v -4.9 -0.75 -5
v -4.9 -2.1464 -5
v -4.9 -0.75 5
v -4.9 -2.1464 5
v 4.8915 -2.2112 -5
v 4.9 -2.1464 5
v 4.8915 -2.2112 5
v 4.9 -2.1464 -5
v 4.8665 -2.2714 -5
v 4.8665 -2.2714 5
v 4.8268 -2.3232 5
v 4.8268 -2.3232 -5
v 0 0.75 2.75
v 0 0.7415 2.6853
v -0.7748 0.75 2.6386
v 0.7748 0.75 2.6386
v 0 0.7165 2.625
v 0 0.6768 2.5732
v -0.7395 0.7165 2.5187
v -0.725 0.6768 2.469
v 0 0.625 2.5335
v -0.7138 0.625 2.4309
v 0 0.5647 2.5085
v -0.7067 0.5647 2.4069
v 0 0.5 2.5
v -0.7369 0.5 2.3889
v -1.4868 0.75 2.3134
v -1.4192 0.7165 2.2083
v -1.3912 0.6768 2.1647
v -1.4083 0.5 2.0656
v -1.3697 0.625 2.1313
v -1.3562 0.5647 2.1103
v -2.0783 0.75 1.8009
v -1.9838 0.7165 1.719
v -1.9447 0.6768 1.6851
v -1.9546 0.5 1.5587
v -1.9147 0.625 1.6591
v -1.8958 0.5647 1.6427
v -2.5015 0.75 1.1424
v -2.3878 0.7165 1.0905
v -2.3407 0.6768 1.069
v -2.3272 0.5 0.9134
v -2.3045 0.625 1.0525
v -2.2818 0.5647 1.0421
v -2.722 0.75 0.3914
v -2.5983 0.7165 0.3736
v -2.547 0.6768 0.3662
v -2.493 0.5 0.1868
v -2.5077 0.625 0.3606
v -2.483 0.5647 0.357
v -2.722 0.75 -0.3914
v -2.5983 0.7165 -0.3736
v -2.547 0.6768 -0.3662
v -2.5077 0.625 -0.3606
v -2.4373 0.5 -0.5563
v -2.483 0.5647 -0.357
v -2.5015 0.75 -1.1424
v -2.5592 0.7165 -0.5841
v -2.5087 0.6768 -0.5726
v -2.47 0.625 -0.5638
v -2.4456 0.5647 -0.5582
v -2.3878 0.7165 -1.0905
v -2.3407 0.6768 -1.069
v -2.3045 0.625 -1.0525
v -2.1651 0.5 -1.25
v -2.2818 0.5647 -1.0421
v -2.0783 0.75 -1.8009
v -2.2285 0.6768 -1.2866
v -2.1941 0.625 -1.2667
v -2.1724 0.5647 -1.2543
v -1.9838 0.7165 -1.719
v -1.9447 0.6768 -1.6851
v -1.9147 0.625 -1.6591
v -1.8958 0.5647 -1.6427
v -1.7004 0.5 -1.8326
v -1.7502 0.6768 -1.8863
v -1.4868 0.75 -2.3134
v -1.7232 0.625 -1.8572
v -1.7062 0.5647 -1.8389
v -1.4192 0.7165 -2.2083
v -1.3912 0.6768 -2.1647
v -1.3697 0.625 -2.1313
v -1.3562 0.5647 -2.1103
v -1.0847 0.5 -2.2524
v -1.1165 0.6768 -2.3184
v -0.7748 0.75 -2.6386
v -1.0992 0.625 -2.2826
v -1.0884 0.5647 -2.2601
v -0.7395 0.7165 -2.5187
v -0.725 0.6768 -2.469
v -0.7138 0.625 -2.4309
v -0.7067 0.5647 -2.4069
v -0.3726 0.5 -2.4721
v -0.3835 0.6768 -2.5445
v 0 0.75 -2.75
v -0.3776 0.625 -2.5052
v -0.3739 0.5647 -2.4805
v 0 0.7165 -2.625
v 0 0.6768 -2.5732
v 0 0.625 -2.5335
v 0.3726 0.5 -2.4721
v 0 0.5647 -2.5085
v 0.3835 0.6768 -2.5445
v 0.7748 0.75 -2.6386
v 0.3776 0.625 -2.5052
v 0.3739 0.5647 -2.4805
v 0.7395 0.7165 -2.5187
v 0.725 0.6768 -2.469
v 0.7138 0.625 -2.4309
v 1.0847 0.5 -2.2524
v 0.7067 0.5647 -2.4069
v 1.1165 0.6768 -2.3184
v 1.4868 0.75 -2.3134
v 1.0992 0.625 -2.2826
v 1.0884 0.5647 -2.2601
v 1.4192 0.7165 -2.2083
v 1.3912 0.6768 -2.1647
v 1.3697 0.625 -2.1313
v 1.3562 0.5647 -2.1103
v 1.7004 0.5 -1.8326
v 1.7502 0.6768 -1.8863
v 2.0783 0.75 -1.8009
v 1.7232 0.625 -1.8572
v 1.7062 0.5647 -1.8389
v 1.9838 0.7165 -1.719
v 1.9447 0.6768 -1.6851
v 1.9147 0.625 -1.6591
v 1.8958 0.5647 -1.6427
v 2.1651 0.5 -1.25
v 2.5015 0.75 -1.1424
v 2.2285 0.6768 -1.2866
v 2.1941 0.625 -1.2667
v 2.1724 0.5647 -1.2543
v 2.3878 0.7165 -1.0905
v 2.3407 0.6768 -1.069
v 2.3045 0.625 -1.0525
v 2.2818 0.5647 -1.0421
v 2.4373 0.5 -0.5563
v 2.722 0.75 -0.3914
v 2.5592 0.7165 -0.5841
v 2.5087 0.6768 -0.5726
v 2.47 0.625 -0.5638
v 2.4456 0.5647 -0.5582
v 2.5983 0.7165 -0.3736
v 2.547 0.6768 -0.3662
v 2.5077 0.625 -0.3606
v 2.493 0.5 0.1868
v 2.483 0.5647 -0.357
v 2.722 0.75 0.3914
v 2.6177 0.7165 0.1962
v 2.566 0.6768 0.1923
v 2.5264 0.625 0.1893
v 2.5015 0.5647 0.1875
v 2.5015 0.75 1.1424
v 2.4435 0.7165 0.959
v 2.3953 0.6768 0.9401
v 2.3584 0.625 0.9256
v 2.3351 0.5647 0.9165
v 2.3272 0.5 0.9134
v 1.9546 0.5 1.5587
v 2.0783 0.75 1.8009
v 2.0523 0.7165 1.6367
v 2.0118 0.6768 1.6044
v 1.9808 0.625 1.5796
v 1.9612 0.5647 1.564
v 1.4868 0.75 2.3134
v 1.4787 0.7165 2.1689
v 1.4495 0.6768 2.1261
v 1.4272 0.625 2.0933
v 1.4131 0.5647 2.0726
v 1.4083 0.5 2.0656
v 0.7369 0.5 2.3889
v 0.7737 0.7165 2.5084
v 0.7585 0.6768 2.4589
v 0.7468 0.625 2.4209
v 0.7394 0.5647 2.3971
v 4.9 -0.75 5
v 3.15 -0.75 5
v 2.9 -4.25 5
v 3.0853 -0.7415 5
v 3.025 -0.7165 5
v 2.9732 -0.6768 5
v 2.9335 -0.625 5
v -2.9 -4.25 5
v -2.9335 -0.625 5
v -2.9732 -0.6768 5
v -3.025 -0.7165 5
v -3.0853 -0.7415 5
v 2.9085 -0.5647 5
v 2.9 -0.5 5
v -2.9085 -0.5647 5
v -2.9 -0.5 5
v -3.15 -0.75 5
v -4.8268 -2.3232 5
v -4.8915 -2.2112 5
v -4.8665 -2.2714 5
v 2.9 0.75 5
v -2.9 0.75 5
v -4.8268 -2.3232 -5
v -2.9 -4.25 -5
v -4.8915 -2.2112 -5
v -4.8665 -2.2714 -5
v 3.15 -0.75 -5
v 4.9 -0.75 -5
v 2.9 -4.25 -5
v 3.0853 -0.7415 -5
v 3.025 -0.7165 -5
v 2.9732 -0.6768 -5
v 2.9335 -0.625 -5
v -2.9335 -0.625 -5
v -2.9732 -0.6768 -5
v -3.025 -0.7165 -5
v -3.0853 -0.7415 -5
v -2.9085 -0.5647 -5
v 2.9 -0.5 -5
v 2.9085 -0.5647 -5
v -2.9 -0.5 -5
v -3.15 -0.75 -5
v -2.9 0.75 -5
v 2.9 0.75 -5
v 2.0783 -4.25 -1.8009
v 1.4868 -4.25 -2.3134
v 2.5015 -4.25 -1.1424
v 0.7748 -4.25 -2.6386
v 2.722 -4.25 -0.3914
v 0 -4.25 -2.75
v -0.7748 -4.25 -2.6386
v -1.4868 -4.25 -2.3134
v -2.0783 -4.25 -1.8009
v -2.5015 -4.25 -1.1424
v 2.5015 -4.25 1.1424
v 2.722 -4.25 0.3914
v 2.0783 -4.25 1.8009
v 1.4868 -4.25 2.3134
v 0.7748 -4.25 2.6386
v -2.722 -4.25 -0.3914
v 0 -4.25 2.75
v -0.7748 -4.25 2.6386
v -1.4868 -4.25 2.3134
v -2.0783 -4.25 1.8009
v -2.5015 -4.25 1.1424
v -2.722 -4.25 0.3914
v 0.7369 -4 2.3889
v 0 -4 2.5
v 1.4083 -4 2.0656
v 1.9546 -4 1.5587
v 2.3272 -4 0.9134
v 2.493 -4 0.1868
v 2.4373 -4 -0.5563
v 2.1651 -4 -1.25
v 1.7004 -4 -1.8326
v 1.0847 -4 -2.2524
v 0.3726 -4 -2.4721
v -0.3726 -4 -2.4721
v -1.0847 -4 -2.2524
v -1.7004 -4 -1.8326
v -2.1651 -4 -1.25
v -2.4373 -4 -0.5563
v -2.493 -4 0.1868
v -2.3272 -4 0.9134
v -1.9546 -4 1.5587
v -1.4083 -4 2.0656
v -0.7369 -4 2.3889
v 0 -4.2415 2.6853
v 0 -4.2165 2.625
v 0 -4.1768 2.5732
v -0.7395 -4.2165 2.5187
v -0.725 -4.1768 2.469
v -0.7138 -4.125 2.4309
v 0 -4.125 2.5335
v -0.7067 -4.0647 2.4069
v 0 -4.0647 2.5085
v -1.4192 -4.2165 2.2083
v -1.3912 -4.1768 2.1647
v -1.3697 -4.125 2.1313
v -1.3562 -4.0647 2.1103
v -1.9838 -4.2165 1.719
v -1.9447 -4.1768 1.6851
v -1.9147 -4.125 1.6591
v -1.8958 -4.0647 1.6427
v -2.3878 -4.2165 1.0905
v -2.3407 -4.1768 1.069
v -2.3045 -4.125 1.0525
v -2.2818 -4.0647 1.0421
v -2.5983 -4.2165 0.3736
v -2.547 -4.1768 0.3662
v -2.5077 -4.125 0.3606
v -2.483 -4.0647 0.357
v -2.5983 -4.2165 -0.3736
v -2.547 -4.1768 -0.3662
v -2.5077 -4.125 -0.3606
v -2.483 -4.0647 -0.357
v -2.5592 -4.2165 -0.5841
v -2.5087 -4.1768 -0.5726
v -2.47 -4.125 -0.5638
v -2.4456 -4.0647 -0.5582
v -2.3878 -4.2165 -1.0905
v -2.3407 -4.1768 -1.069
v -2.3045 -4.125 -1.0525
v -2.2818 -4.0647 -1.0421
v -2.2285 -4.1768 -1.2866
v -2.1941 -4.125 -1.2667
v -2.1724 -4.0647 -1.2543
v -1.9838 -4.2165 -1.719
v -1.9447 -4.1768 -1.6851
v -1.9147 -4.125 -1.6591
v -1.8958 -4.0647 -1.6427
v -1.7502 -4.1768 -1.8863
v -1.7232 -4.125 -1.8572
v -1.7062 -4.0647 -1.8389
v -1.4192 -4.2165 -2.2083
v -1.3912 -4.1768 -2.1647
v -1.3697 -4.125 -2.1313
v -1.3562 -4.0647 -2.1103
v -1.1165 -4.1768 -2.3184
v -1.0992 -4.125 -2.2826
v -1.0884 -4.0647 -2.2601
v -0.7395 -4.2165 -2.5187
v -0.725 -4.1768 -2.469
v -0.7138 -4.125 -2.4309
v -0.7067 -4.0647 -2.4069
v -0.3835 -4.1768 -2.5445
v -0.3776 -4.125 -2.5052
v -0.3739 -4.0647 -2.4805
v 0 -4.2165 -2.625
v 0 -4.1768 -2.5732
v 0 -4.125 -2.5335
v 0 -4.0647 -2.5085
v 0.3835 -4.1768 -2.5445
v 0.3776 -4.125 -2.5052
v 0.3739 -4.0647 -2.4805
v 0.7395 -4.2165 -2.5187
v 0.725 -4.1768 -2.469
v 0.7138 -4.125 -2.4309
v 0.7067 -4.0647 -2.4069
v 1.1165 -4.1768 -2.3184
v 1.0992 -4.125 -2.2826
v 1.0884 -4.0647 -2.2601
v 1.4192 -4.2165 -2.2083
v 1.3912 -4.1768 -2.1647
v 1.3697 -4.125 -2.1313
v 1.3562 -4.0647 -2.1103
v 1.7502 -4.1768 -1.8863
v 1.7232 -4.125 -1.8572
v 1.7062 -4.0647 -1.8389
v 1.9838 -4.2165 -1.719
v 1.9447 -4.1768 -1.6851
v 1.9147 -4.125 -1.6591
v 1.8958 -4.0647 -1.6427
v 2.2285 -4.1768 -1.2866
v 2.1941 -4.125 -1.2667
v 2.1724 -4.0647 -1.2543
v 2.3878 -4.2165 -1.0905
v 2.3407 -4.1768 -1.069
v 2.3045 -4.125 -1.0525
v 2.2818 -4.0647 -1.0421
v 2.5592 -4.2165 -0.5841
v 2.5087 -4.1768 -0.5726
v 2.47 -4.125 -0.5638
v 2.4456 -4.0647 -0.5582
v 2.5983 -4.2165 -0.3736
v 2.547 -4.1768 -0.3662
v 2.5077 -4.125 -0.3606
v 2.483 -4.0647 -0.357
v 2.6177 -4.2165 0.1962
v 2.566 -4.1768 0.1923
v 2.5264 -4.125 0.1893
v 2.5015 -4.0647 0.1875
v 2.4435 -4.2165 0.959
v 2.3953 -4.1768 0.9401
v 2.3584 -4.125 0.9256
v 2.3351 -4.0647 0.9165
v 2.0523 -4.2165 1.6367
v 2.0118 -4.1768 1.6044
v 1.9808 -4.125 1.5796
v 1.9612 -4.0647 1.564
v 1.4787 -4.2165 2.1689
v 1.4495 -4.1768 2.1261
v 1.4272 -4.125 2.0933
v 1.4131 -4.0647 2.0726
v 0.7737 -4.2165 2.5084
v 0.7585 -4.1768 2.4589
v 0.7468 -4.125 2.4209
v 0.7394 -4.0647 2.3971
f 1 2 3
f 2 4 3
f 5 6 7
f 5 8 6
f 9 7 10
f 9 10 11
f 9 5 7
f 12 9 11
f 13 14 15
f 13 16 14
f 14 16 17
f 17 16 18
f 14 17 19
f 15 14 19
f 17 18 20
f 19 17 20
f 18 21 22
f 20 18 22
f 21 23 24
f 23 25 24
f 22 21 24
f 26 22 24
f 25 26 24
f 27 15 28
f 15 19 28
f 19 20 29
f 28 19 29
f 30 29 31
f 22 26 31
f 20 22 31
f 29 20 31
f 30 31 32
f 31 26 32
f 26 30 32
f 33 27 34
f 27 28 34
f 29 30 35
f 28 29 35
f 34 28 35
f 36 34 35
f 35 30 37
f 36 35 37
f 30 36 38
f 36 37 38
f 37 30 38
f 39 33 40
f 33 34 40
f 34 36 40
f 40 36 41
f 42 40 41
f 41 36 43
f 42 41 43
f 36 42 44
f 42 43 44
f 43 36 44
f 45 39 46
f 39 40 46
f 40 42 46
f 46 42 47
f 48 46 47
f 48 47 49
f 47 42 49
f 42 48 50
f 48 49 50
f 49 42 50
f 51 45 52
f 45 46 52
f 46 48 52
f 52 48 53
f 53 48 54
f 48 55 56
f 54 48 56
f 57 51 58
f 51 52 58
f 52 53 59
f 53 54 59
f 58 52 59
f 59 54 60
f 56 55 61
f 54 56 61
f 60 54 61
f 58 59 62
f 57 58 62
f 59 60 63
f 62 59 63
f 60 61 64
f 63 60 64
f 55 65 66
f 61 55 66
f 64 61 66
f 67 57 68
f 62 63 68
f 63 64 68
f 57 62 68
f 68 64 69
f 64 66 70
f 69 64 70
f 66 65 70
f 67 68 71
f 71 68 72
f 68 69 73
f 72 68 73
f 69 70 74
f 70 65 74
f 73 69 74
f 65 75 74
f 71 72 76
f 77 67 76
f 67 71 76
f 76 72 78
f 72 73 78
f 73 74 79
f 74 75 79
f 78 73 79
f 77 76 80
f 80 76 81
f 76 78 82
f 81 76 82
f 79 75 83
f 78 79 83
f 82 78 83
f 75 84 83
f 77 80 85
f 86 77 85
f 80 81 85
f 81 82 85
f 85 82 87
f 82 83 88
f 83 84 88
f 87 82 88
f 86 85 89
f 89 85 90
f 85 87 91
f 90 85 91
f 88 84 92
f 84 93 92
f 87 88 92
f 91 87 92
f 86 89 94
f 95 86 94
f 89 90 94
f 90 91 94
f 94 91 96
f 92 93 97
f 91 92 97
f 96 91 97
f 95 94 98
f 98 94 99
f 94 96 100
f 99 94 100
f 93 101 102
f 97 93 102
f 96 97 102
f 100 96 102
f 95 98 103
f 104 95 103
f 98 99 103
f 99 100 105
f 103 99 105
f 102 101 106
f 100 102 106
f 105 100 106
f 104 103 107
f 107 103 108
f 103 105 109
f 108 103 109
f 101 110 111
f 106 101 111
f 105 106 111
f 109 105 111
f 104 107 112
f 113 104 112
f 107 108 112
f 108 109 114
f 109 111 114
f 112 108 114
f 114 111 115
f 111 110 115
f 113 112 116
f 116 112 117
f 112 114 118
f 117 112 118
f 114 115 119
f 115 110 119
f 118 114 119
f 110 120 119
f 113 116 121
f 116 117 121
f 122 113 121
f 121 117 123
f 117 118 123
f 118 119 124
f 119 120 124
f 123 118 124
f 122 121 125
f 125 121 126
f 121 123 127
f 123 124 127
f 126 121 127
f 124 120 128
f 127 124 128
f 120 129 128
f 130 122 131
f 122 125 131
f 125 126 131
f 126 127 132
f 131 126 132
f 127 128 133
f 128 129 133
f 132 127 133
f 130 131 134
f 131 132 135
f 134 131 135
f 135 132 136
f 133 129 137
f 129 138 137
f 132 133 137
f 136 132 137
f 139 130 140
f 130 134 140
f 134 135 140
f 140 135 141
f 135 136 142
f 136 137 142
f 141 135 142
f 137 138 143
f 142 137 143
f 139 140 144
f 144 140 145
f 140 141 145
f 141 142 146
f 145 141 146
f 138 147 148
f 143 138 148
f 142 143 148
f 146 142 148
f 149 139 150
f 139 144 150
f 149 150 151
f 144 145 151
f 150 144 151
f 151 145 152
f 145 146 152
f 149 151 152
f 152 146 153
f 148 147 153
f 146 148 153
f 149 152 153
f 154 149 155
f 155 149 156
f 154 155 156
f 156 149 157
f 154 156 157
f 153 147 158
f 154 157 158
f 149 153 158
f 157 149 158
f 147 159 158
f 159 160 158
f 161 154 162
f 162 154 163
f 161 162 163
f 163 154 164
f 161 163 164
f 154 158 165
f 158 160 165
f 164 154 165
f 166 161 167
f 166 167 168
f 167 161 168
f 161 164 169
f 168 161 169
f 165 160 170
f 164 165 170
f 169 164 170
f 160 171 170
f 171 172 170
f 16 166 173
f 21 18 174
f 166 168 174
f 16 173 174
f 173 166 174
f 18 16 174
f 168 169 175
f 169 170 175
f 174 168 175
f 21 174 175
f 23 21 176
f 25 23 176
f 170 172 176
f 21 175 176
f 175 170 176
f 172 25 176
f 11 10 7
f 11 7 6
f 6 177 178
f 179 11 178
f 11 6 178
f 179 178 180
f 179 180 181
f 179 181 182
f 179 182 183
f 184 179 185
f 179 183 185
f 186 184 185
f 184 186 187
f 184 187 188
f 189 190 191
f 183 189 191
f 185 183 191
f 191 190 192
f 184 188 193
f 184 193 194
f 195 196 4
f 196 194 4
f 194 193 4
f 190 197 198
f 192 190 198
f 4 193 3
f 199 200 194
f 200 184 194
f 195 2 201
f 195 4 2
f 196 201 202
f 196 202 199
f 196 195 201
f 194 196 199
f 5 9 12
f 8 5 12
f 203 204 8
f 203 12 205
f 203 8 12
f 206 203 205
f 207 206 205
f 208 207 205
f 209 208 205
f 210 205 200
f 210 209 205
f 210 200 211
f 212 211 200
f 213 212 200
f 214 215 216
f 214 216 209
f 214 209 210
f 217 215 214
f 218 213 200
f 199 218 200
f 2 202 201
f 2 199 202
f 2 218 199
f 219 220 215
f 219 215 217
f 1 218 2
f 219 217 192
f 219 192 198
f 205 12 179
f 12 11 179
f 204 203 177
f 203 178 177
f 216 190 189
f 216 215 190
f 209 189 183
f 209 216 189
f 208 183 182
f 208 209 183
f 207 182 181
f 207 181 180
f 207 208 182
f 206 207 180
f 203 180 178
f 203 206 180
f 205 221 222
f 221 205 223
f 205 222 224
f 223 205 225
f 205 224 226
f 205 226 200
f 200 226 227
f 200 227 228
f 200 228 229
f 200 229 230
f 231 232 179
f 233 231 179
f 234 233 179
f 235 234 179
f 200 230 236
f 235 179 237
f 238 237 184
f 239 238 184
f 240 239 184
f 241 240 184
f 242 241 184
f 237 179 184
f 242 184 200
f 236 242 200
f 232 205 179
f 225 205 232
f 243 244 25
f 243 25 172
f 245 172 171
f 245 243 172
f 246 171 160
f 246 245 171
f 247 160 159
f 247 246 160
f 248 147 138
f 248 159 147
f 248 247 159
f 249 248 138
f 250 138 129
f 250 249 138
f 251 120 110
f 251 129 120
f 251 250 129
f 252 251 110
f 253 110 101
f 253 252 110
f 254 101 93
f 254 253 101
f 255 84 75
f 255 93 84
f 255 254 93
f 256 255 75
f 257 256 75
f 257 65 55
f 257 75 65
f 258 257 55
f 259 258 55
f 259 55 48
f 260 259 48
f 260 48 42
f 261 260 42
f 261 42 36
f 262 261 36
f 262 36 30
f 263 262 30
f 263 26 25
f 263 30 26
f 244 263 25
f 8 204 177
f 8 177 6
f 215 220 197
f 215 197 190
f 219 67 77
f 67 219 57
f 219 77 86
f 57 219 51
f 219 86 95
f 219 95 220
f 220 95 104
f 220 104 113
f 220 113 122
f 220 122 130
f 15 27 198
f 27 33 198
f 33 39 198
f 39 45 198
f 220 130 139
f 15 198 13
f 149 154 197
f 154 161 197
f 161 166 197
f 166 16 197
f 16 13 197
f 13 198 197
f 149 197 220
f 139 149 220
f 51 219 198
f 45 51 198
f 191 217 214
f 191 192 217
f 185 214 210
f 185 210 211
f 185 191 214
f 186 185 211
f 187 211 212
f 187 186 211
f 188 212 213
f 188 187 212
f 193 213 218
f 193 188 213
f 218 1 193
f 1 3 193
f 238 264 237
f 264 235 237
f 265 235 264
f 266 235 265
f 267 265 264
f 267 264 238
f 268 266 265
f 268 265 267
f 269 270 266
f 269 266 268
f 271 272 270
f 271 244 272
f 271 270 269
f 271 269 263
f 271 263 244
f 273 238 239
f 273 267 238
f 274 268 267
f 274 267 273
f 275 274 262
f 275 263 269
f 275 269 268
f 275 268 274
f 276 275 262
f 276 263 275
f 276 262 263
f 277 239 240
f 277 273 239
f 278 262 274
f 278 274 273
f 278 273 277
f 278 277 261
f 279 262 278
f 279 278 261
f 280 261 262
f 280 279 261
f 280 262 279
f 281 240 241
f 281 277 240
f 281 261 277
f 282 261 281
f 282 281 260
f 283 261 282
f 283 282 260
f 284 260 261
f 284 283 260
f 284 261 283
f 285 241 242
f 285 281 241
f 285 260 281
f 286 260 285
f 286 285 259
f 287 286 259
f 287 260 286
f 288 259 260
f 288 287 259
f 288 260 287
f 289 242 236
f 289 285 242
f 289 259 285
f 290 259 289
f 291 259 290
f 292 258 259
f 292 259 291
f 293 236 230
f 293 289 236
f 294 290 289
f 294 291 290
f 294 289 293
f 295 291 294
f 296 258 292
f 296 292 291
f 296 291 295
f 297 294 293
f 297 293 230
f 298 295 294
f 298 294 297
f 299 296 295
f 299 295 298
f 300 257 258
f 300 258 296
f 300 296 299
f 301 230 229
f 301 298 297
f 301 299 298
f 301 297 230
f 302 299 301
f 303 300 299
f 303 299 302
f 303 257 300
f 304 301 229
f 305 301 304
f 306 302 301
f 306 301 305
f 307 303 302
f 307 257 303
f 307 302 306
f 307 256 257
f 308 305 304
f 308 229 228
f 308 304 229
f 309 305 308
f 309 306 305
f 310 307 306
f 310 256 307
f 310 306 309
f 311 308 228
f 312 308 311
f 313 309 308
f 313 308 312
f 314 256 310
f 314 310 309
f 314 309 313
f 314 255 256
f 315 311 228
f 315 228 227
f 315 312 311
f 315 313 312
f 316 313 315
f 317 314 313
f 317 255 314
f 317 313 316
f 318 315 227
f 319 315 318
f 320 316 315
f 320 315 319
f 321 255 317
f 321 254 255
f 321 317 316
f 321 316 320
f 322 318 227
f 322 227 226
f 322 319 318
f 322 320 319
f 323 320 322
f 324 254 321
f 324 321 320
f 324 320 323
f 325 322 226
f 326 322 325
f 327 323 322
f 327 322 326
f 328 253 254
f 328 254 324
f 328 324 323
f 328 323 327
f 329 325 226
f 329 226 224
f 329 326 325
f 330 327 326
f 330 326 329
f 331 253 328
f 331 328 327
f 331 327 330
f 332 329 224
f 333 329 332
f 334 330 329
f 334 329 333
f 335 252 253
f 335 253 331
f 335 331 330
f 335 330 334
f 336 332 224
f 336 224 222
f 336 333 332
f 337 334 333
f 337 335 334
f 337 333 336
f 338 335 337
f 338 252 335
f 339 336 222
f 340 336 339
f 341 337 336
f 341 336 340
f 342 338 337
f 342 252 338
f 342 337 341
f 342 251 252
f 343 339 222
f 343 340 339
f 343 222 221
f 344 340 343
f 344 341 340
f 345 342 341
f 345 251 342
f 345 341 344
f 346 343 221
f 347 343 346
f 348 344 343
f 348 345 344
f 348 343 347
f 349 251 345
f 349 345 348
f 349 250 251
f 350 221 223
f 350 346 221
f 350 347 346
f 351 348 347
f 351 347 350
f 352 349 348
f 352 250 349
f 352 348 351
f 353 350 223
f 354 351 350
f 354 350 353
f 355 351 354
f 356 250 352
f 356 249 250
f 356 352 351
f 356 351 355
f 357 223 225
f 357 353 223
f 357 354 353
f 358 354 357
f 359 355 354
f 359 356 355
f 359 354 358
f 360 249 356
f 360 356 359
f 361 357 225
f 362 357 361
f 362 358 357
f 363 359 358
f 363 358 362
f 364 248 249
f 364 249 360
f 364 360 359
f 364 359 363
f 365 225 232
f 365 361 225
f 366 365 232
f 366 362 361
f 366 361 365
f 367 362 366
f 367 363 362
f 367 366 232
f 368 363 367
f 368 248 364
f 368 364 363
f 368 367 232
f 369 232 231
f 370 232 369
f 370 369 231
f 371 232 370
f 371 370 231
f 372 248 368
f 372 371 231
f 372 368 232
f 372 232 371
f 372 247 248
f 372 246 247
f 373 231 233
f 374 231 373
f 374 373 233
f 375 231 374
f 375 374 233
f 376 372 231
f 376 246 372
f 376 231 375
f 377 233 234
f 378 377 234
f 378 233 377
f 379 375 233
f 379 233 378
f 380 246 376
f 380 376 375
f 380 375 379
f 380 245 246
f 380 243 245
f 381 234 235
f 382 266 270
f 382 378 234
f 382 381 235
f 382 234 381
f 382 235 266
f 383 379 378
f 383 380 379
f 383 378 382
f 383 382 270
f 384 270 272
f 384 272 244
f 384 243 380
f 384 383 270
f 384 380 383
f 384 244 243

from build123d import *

# Parameters (mm, degrees)
BOSS_EXTRUDE1_DEPTH     = 5
CUT_EXTRUDE1_DEPTH      = 9.189780217
CUT_EXTRUDE1_DEPTH_BACK = 9.189780217
SKETCH2_R               = 2.5
FILLET1_R               = 0.25
FILLET2_R               = 0.25


with BuildPart() as part:
    # Sketch1 → Boss-Extrude1 (new, symmetric)
    with BuildSketch(Plane.XY):
        Polygon((-2.9, -0.75), (-2.9, 0.75), (2.9, 0.75), (2.9, -0.75), (4.9, -0.75), (4.9, -2.25), (2.9, -4.25), (-2.9, -4.25), (-4.9, -2.25), (-4.9, -0.75), align=None)
    extrude(amount=BOSS_EXTRUDE1_DEPTH, both=True)

    # Sketch2 → Cut-Extrude1 (cut, two sides: drawn at the far end of the back side and taken through both)
    with BuildSketch(Plane(origin=(0, 0, 0), x_dir=(1, 0, 0), z_dir=(0, 1, 0)).offset(-CUT_EXTRUDE1_DEPTH_BACK)):
        with Locations(Location((0, 0, 0), (0, 0, 270))):
            Circle(SKETCH2_R)
    extrude(amount=CUT_EXTRUDE1_DEPTH + CUT_EXTRUDE1_DEPTH_BACK, mode=Mode.SUBTRACT)

    # Fillet1
    fillet1_edges = [part.edges().sort_by_distance(p)[0] for p in [
        (2.9, -0.75, 0),
        (4.9, -2.25, 0),
        (-4.9, -2.25, 0),
        (-2.9, -0.75, 0),
    ]]
    fillet(fillet1_edges, radius=FILLET1_R)

    # Fillet2
    fillet2_edges = [part.edges().sort_by_distance(p)[0] for p in [
        (0, -4.25, -2.5),
        (0, 0.75, -2.5),
    ]]
    fillet(fillet2_edges, radius=FILLET2_R)


solid = part.part
